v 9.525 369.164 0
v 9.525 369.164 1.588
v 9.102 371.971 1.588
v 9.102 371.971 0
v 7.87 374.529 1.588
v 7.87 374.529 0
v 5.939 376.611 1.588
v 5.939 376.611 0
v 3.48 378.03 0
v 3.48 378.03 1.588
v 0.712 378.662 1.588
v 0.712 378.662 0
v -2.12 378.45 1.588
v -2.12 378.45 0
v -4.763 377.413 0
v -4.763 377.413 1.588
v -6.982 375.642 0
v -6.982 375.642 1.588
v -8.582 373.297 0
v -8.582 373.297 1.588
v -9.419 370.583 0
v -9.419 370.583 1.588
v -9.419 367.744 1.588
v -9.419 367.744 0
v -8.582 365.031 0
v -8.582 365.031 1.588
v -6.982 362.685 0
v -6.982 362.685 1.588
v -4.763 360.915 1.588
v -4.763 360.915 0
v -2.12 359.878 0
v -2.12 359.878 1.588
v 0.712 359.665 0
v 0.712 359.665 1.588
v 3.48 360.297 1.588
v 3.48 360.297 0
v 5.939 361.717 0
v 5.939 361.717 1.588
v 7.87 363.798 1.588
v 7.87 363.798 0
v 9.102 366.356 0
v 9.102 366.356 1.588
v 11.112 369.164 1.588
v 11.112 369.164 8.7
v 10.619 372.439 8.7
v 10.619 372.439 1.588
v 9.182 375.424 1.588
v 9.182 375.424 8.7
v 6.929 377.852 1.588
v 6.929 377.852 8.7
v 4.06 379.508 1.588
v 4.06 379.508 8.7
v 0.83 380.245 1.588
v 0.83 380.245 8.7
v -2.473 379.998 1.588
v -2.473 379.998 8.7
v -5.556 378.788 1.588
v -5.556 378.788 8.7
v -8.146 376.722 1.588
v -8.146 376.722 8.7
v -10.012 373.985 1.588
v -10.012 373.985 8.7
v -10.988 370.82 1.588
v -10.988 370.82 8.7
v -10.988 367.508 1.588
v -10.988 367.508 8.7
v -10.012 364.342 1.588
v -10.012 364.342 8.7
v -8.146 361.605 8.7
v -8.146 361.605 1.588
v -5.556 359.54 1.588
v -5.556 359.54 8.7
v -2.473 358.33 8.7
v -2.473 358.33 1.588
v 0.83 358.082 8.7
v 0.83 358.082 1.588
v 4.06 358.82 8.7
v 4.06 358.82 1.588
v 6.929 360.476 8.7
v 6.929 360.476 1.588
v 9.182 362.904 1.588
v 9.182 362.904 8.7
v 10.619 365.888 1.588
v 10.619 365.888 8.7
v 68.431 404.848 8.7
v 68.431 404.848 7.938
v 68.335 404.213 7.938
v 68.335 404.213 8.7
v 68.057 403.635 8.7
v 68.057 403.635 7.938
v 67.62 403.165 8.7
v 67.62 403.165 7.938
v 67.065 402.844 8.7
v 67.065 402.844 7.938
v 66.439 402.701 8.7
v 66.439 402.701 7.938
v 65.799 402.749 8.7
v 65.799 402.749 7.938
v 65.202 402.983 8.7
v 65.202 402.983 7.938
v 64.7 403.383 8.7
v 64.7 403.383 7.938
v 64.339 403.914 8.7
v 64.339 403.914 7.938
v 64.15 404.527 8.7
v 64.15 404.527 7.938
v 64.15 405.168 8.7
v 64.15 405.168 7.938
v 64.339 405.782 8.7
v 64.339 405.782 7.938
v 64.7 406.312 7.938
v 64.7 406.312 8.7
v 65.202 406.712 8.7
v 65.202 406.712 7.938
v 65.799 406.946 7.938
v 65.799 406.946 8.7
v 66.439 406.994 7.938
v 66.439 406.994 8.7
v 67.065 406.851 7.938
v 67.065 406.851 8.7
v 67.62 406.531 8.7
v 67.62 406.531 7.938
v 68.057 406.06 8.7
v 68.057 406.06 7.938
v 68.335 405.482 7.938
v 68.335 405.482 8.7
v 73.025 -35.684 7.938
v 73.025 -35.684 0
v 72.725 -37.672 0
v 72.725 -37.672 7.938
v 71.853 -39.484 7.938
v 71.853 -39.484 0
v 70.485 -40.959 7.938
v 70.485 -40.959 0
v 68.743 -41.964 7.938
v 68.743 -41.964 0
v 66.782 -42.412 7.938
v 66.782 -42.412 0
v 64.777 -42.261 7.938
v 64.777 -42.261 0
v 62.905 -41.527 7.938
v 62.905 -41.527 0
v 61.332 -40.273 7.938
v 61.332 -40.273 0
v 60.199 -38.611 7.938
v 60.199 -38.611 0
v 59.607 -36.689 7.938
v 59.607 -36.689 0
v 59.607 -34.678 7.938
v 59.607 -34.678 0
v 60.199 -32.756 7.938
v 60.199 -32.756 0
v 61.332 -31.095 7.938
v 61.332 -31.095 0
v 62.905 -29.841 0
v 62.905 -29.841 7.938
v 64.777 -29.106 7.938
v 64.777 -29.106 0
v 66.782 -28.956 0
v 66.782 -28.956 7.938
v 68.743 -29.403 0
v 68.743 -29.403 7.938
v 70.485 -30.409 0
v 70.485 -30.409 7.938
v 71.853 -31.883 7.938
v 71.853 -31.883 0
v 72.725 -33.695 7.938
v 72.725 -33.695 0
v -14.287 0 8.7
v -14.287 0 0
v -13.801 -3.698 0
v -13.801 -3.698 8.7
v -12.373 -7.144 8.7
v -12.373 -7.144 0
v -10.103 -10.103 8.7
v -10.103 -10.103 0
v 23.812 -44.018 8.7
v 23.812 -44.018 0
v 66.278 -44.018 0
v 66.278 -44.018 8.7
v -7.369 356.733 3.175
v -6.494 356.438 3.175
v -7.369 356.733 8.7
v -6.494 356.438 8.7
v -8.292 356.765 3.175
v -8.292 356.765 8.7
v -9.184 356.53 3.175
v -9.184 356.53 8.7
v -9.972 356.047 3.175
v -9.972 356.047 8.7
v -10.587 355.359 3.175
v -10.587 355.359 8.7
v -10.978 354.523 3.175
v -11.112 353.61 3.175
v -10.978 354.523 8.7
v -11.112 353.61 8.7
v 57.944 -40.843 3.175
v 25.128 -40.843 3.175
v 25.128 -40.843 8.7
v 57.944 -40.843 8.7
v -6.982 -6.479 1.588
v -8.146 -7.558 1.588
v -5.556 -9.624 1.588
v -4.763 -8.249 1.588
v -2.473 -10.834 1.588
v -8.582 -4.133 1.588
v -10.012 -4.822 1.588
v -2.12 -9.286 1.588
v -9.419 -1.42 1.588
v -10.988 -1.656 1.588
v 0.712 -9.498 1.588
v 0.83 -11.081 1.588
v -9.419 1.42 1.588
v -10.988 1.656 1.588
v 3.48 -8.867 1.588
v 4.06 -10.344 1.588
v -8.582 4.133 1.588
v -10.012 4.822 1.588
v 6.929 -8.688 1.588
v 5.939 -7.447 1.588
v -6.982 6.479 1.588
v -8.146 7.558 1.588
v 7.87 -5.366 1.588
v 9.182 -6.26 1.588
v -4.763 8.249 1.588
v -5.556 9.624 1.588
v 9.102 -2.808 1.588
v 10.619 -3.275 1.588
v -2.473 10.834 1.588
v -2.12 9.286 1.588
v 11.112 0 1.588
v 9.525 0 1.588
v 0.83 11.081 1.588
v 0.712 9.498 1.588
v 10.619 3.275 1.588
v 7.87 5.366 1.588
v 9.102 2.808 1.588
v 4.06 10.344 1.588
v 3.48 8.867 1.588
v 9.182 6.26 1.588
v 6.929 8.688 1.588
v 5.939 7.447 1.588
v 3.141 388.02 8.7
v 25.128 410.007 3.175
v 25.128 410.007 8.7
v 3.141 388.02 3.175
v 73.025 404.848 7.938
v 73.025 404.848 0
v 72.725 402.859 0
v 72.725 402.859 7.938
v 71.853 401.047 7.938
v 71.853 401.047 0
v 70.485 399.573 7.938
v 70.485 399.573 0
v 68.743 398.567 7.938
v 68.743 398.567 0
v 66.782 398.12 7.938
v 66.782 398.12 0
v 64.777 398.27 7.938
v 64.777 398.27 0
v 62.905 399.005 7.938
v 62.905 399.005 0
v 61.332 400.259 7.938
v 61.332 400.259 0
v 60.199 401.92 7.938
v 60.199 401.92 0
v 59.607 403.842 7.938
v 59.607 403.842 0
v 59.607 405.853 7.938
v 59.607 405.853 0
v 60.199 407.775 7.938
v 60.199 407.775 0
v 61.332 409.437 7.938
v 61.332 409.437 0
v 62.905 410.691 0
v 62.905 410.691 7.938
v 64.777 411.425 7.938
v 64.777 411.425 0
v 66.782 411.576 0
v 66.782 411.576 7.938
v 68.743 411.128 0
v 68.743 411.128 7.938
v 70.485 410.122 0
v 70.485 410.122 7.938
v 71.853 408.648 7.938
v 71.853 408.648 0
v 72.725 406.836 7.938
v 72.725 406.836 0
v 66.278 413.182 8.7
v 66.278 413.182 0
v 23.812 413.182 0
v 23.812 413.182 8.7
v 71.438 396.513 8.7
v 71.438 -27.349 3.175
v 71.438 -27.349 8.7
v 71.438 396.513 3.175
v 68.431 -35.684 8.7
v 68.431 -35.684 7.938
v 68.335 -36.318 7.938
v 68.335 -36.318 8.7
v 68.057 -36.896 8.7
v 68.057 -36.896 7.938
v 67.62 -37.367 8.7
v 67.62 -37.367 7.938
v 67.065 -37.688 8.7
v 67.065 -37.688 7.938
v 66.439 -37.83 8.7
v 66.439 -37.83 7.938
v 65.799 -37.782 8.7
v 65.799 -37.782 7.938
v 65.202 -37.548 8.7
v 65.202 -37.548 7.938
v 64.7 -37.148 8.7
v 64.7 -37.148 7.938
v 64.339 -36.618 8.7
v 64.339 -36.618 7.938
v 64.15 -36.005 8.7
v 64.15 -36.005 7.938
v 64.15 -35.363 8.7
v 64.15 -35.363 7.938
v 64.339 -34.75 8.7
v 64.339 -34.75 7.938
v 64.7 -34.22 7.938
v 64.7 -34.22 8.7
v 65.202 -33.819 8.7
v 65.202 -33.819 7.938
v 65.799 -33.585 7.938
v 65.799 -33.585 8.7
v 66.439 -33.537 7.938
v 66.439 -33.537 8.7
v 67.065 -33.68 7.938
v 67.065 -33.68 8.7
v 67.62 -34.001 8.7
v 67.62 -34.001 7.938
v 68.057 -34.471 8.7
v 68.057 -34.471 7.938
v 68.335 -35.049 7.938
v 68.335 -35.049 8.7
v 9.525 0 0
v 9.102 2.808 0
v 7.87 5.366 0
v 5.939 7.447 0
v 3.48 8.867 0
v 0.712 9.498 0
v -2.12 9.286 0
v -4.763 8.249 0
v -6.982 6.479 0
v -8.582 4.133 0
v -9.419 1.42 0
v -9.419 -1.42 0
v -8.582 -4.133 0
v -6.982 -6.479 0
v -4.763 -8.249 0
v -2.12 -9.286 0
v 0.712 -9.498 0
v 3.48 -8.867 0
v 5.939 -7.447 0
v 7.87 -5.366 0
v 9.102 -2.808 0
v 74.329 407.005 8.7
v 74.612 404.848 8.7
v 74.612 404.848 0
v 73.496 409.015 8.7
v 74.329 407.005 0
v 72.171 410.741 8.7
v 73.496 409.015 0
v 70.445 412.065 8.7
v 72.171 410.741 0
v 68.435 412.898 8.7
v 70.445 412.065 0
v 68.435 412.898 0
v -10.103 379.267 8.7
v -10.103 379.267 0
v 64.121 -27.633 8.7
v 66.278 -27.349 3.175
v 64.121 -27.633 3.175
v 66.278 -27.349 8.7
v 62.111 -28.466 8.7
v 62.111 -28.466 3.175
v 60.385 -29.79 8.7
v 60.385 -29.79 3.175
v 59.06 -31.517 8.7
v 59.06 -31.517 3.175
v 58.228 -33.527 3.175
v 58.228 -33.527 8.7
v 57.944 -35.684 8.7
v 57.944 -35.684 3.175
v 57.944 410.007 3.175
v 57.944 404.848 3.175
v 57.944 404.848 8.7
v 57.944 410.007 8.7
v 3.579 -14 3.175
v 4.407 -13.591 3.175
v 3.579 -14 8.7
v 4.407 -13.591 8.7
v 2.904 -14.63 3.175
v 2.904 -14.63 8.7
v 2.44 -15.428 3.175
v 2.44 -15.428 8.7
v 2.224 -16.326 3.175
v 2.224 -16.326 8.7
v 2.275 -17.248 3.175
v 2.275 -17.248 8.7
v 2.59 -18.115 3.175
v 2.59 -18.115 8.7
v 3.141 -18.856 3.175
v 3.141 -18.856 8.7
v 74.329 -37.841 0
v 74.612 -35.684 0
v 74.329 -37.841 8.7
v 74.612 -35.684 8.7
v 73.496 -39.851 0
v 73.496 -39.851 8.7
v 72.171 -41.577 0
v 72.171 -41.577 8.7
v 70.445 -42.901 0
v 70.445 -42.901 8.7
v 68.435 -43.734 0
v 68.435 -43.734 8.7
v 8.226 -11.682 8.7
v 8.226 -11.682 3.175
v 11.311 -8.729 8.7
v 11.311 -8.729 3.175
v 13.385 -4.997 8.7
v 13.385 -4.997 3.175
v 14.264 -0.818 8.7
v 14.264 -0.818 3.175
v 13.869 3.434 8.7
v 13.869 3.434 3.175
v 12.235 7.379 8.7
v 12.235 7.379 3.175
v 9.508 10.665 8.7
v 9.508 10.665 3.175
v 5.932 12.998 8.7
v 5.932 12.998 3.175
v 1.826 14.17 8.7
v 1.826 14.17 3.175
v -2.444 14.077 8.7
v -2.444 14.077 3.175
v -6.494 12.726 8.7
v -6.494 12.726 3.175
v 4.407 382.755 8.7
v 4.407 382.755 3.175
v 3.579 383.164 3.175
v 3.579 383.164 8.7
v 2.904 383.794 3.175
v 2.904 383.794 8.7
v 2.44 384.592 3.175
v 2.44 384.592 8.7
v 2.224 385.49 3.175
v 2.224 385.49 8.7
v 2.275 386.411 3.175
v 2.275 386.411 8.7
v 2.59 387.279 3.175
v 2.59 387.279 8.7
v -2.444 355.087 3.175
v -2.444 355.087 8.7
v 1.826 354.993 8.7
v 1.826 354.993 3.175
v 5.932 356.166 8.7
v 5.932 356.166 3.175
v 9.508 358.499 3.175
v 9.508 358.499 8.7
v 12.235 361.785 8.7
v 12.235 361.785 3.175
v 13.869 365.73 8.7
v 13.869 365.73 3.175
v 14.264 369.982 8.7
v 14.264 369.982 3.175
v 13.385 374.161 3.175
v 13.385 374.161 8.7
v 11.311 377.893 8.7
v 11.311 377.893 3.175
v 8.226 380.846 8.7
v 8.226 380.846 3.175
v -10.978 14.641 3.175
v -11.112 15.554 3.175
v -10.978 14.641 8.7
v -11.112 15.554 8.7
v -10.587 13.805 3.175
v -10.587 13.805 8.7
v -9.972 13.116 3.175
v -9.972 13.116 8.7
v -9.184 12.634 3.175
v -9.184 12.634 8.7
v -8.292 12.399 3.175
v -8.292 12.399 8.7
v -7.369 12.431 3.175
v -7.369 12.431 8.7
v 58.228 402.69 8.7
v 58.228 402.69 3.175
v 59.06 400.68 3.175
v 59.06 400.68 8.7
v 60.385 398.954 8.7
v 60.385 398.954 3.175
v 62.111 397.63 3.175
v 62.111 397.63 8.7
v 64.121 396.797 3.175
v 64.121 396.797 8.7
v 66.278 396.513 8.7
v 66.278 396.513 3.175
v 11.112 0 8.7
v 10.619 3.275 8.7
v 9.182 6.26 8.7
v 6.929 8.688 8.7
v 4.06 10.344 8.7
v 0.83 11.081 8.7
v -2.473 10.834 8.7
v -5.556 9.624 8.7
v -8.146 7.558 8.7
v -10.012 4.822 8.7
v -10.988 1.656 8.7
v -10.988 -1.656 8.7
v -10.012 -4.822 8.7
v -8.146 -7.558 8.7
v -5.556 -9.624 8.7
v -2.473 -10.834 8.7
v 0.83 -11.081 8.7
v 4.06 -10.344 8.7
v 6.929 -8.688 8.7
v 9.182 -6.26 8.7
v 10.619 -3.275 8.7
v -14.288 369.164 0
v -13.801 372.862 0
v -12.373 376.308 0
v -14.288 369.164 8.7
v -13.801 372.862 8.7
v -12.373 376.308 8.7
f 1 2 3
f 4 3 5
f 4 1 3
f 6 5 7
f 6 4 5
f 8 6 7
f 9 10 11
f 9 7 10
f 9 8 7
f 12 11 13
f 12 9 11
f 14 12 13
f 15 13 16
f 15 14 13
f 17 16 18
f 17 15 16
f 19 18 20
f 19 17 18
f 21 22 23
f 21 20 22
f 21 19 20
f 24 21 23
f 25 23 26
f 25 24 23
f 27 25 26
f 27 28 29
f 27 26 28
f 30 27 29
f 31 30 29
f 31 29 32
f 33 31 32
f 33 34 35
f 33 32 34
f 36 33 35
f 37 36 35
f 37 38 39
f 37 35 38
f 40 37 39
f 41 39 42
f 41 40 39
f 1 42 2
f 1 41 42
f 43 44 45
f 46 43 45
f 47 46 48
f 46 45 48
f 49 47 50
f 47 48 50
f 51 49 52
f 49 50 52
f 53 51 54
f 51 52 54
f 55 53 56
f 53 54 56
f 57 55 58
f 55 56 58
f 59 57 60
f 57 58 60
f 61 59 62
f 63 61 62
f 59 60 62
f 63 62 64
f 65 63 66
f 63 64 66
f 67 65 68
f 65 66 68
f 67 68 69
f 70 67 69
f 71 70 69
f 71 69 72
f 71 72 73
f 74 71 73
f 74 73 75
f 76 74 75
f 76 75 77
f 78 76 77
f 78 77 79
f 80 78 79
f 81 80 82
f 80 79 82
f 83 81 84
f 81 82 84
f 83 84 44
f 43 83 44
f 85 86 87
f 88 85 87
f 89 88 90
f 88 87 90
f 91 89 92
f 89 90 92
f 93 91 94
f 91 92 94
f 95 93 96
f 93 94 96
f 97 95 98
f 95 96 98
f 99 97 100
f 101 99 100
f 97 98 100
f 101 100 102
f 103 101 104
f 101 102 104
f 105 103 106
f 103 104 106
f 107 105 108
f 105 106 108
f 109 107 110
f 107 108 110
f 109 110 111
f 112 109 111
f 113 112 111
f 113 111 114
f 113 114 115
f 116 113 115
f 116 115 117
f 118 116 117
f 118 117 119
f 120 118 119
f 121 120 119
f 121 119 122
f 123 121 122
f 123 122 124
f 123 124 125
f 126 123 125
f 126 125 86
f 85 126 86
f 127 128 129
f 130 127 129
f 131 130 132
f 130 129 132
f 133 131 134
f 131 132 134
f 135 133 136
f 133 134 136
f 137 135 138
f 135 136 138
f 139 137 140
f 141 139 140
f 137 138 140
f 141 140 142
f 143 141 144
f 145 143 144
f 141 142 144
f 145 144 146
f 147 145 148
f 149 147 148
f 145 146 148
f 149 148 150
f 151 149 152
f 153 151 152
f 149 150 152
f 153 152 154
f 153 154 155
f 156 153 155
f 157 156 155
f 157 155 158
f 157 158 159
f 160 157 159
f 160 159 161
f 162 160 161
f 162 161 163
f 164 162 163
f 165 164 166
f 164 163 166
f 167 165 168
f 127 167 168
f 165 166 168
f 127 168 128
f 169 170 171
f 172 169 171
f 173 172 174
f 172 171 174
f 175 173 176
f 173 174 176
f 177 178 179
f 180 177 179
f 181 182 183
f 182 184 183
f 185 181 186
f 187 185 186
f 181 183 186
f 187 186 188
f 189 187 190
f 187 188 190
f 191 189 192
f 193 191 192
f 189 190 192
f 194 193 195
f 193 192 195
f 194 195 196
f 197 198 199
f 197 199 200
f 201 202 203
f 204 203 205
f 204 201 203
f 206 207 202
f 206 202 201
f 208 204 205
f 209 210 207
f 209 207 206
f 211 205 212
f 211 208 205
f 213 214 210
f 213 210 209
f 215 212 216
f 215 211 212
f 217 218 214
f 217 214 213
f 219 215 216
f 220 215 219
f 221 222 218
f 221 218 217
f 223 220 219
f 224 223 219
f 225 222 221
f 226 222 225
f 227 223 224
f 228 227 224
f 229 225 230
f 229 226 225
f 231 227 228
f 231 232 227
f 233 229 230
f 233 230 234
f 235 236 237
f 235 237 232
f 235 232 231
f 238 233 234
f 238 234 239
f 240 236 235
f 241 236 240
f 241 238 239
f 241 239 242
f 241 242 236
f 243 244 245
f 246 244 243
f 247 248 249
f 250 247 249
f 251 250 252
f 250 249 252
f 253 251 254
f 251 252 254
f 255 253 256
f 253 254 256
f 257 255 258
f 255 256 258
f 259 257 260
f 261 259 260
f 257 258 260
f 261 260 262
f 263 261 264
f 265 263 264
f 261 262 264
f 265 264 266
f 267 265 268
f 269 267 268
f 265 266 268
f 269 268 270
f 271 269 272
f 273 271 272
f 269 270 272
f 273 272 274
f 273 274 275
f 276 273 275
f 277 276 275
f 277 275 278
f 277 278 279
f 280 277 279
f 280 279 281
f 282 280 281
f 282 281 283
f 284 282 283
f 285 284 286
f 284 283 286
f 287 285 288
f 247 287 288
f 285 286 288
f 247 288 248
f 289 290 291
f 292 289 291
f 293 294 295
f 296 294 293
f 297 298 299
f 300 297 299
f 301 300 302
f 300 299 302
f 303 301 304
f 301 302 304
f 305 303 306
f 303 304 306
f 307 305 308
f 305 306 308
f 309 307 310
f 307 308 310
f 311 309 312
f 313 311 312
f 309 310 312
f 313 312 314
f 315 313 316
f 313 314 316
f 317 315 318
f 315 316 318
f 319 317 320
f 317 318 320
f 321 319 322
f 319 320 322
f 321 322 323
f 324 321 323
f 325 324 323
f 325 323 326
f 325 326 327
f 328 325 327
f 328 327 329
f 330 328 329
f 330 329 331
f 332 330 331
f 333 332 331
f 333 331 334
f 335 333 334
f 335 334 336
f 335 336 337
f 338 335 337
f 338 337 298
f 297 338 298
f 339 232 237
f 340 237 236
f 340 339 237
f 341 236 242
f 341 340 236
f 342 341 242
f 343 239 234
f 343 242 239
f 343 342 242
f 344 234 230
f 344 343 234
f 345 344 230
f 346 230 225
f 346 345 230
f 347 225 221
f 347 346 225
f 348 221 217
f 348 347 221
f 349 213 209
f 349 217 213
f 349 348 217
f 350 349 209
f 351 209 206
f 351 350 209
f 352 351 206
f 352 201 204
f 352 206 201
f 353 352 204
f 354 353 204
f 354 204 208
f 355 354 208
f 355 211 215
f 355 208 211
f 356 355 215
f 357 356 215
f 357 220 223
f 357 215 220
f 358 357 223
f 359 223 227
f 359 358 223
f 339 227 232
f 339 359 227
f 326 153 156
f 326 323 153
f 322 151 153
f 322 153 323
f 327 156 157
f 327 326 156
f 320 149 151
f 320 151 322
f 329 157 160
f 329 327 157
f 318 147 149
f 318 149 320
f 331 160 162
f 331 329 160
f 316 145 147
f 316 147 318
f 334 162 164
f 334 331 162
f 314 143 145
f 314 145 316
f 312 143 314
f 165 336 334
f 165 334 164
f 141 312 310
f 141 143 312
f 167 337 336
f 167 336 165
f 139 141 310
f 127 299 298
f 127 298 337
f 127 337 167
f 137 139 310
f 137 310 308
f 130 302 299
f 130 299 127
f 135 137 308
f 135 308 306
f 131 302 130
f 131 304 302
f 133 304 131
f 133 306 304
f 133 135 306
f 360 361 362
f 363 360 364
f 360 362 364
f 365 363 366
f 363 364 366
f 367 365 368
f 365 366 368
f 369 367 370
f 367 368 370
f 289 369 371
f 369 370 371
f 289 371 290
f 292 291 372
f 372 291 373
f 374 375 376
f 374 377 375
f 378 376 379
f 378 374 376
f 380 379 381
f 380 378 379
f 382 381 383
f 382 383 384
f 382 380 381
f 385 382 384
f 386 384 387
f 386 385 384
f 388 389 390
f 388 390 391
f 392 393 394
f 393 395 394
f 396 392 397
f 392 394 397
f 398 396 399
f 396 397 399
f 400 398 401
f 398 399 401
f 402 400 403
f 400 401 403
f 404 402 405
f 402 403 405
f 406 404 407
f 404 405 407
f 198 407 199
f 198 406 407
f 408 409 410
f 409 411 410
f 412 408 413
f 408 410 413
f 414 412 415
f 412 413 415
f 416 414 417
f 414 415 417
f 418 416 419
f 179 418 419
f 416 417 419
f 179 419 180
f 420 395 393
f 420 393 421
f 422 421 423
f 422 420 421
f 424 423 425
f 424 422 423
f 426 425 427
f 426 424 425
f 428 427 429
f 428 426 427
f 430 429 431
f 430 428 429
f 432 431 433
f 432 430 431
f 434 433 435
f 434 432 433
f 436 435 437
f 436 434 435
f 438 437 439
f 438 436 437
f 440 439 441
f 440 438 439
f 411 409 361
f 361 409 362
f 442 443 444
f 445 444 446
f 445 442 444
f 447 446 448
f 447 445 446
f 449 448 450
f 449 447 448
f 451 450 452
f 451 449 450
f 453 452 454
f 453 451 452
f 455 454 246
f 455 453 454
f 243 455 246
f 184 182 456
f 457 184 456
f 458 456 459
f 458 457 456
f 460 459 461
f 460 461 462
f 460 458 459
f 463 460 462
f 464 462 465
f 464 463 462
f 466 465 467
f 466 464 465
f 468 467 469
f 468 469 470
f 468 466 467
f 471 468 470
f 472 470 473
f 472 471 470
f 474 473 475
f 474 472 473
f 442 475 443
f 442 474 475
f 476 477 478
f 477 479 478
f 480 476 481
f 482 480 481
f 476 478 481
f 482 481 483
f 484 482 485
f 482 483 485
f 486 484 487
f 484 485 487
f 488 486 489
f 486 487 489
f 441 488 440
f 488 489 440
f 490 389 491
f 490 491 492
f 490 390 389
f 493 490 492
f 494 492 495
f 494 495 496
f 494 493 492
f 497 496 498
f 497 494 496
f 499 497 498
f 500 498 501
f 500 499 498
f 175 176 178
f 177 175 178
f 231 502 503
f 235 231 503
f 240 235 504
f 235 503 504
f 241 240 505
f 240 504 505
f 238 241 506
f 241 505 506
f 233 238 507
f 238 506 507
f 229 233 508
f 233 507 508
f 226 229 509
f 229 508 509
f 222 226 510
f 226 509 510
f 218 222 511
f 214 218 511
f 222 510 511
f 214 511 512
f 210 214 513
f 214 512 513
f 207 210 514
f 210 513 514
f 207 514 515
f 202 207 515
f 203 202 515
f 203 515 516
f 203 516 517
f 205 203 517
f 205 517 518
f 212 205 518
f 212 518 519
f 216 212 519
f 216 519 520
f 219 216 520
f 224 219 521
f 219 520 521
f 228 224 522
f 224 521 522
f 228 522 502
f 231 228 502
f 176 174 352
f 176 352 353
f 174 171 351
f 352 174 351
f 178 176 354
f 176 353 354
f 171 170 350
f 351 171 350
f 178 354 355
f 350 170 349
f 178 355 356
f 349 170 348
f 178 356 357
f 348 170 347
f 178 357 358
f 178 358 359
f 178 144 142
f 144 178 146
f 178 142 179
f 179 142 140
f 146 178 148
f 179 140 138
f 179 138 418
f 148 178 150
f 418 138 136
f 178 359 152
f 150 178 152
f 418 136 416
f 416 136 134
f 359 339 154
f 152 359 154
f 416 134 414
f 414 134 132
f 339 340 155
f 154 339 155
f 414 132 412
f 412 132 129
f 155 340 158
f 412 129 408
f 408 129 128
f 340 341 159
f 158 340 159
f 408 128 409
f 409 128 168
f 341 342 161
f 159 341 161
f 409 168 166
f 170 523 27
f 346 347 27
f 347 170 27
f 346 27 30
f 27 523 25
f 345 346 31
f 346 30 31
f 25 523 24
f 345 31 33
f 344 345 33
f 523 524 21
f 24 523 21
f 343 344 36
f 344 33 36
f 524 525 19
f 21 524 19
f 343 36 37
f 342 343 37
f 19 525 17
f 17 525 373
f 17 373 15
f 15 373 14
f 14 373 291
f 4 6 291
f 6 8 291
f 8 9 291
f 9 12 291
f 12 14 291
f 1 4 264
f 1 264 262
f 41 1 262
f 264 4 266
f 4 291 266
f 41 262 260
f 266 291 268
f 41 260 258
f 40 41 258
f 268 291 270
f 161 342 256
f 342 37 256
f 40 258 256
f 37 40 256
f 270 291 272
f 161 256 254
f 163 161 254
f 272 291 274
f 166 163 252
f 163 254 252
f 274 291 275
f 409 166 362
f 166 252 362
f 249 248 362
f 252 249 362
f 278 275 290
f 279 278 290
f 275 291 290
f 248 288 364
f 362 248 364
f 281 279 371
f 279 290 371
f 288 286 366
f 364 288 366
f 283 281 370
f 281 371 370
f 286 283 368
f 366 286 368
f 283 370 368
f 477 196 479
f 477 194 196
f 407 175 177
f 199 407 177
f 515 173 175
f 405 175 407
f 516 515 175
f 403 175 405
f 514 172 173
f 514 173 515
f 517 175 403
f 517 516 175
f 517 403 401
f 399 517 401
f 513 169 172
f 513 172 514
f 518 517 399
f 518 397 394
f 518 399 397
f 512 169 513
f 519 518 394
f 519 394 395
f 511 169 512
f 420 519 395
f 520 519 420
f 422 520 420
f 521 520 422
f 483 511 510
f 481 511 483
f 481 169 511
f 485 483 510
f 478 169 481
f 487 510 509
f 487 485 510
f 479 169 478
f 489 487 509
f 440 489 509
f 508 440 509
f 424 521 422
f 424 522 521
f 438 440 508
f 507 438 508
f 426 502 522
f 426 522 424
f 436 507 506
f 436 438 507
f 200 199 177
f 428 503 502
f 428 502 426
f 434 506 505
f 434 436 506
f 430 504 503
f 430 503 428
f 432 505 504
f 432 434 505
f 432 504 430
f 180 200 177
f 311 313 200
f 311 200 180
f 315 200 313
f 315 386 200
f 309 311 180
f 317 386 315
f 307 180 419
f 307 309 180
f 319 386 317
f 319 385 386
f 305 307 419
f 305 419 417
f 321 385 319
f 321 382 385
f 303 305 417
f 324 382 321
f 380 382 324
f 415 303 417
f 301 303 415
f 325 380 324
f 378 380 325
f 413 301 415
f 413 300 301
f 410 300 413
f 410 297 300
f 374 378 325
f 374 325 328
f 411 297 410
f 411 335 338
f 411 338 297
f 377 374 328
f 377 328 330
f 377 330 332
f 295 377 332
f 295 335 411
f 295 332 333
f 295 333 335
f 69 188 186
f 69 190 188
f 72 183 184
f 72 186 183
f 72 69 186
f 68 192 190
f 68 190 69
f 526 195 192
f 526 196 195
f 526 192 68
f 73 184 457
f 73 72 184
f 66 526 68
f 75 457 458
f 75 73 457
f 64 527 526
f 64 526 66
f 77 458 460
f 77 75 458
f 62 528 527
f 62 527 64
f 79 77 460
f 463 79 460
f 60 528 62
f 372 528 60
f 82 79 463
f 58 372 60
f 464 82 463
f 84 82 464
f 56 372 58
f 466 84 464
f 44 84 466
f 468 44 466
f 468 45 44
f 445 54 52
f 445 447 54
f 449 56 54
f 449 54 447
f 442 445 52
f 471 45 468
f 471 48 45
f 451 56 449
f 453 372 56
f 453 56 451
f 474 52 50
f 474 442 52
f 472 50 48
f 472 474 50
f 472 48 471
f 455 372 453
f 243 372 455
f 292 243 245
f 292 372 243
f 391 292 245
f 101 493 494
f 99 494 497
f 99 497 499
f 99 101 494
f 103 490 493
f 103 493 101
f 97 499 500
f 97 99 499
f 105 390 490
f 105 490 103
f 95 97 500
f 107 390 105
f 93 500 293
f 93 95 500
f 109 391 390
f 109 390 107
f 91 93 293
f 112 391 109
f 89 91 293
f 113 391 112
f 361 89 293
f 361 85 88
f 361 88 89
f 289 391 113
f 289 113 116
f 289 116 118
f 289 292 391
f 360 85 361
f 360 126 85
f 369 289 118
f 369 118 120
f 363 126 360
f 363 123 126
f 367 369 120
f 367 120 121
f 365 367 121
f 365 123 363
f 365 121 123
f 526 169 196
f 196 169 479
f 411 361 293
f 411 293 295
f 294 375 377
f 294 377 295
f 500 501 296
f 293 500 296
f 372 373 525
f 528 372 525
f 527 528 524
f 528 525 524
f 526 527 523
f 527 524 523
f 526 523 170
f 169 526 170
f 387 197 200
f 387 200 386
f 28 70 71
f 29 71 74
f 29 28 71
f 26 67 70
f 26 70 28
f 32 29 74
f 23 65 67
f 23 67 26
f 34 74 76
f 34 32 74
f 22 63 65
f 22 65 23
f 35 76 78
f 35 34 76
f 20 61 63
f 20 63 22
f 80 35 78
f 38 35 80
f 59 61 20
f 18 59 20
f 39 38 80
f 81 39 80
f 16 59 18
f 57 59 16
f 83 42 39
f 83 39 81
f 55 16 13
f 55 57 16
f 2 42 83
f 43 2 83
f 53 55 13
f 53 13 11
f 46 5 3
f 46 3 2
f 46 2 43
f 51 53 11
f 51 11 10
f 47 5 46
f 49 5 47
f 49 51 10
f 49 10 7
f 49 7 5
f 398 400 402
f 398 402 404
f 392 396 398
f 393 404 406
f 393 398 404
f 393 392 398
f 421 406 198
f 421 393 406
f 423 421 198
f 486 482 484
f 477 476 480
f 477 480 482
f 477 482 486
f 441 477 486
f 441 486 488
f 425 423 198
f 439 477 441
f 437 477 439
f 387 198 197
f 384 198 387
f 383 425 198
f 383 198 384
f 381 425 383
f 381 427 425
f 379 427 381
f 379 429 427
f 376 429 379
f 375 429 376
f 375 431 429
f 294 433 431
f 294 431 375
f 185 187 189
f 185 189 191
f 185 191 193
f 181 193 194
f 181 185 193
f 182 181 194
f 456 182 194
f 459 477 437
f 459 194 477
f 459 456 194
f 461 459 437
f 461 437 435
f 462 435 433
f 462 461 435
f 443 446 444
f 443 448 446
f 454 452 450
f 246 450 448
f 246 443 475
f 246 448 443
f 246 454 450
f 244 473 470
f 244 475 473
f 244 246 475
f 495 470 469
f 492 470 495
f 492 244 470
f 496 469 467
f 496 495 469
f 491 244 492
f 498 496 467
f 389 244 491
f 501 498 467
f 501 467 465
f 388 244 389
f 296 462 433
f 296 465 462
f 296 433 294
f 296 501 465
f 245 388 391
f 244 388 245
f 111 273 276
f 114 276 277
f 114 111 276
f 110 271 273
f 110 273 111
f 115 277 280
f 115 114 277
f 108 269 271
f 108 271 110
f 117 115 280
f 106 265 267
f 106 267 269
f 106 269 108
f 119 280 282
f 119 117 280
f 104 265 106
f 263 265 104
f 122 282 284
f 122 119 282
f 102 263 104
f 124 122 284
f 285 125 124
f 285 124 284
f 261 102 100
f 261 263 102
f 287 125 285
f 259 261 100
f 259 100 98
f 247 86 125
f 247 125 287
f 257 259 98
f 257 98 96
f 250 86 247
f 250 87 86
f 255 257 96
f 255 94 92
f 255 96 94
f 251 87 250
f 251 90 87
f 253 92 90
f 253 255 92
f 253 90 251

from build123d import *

# Parameters (mm, degrees)
F0_R      = 9.525
F1_DEPTH  = 8.6995
F2_R      = 11.1125
F3_DEPTH  = 7.112
F4_T      = -3.175
F5_R      = 3.175
F6_W      = 16.66875
F6_H      = 16.66875
F7_DEPTH  = 5.5245
F8_R      = 8.334375
F9_R      = 6.746875
F10_DEPTH = 7.9375
F11_R     = 2.15265
F12_DEPTH = 8.6995


with BuildPart() as f1:
    # F0 (on Top) → F1 (new body)
    with BuildSketch(Plane.XY):
        with BuildLine():
            Line((-14.2875, 369.1638474552), (-14.2875, 0))
            ThreePointArc((-14.2875, 0), (-13.1999288208, -5.4675895399), (-10.1027881362, -10.1027881362))
            Line((-10.1027881362, -10.1027881362), (23.8125, -44.0180762724))
            Line((23.8125, -44.0180762724), (74.6125, -44.0180762724))
            Line((74.6125, -44.0180762724), (74.6125, 413.1819237276))
            Line((74.6125, 413.1819237276), (23.8125, 413.1819237276))
            Line((23.8125, 413.1819237276), (-10.1027881362, 379.2666355914))
            ThreePointArc((-10.1027881362, 379.2666355914), (-13.1999288208, 374.6314369951), (-14.2875, 369.1638474552))
        make_face()
        Circle(F0_R, mode=Mode.SUBTRACT)
        with Locations((0, 369.1638474552)):
            Circle(F0_R, mode=Mode.SUBTRACT)
    extrude(amount=F1_DEPTH)

    # F2 (on face) → F3 (cut)
    with BuildSketch(Plane.XY.offset(8.6995)):
        with Locations((0, 369.1638474552)):
            Circle(F2_R)
        Circle(F2_R)
    extrude(amount=-F3_DEPTH, mode=Mode.SUBTRACT)

    # F4
    f4_openings = [f1.faces().sort_by_distance(p)[0] for p in [
        (31.981731, 184.581924, 8.6995),
    ]]
    offset(amount=F4_T, openings=f4_openings)

    # F5
    f5_edges = [f1.edges().sort_by_distance(p)[0] for p in [
        (-1.507724, 383.371572, 5.93725),
        (-11.1125, 360.183591, 5.93725),
        (-11.1125, 8.980256, 5.93725),
        (-1.507724, -14.207724, 5.93725),
    ]]
    fillet(f5_edges, radius=F5_R)

    # F6 (on face) → F7 (join, through all)
    with BuildSketch(Plane.XY.offset(3.175)):
        with Locations((66.278125, 404.8475487276)):
            Rectangle(F6_W, F6_H)
        with Locations((66.278125, -35.6837012724)):
            Rectangle(F6_W, F6_H)
    extrude(amount=F7_DEPTH)

    # F8
    f8_edges = [f1.edges().sort_by_distance(p)[0] for p in [
        (74.6125, 413.181924, 4.34975),
        (74.6125, -44.018076, 4.34975),
        (57.94375, -27.349326, 5.93725),
        (57.94375, 396.513174, 5.93725),
    ]]
    fillet(f8_edges, radius=F8_R)

    # F9 (on face) → F10 (cut)
    with BuildSketch(Plane(origin=(0, 0, 0), x_dir=(1, 0, 0), z_dir=(0, 0, -1))):
        with Locations((66.278125, 35.6837012724)):
            Circle(F9_R)
        with Locations((66.278125, -404.8475487276)):
            Circle(F9_R)
    extrude(amount=-F10_DEPTH, mode=Mode.SUBTRACT)

    # F11 (on face) → F12 (cut, through all)
    with BuildSketch(Plane(origin=(0, 0, 0), x_dir=(1, 0, 0), z_dir=(0, 0, -1))):
        with Locations((66.278125, 35.6837012724)):
            Circle(F11_R)
        with Locations((66.278125, -404.8475487276)):
            Circle(F11_R)
    extrude(amount=-F12_DEPTH, mode=Mode.SUBTRACT)


solid = f1.part
